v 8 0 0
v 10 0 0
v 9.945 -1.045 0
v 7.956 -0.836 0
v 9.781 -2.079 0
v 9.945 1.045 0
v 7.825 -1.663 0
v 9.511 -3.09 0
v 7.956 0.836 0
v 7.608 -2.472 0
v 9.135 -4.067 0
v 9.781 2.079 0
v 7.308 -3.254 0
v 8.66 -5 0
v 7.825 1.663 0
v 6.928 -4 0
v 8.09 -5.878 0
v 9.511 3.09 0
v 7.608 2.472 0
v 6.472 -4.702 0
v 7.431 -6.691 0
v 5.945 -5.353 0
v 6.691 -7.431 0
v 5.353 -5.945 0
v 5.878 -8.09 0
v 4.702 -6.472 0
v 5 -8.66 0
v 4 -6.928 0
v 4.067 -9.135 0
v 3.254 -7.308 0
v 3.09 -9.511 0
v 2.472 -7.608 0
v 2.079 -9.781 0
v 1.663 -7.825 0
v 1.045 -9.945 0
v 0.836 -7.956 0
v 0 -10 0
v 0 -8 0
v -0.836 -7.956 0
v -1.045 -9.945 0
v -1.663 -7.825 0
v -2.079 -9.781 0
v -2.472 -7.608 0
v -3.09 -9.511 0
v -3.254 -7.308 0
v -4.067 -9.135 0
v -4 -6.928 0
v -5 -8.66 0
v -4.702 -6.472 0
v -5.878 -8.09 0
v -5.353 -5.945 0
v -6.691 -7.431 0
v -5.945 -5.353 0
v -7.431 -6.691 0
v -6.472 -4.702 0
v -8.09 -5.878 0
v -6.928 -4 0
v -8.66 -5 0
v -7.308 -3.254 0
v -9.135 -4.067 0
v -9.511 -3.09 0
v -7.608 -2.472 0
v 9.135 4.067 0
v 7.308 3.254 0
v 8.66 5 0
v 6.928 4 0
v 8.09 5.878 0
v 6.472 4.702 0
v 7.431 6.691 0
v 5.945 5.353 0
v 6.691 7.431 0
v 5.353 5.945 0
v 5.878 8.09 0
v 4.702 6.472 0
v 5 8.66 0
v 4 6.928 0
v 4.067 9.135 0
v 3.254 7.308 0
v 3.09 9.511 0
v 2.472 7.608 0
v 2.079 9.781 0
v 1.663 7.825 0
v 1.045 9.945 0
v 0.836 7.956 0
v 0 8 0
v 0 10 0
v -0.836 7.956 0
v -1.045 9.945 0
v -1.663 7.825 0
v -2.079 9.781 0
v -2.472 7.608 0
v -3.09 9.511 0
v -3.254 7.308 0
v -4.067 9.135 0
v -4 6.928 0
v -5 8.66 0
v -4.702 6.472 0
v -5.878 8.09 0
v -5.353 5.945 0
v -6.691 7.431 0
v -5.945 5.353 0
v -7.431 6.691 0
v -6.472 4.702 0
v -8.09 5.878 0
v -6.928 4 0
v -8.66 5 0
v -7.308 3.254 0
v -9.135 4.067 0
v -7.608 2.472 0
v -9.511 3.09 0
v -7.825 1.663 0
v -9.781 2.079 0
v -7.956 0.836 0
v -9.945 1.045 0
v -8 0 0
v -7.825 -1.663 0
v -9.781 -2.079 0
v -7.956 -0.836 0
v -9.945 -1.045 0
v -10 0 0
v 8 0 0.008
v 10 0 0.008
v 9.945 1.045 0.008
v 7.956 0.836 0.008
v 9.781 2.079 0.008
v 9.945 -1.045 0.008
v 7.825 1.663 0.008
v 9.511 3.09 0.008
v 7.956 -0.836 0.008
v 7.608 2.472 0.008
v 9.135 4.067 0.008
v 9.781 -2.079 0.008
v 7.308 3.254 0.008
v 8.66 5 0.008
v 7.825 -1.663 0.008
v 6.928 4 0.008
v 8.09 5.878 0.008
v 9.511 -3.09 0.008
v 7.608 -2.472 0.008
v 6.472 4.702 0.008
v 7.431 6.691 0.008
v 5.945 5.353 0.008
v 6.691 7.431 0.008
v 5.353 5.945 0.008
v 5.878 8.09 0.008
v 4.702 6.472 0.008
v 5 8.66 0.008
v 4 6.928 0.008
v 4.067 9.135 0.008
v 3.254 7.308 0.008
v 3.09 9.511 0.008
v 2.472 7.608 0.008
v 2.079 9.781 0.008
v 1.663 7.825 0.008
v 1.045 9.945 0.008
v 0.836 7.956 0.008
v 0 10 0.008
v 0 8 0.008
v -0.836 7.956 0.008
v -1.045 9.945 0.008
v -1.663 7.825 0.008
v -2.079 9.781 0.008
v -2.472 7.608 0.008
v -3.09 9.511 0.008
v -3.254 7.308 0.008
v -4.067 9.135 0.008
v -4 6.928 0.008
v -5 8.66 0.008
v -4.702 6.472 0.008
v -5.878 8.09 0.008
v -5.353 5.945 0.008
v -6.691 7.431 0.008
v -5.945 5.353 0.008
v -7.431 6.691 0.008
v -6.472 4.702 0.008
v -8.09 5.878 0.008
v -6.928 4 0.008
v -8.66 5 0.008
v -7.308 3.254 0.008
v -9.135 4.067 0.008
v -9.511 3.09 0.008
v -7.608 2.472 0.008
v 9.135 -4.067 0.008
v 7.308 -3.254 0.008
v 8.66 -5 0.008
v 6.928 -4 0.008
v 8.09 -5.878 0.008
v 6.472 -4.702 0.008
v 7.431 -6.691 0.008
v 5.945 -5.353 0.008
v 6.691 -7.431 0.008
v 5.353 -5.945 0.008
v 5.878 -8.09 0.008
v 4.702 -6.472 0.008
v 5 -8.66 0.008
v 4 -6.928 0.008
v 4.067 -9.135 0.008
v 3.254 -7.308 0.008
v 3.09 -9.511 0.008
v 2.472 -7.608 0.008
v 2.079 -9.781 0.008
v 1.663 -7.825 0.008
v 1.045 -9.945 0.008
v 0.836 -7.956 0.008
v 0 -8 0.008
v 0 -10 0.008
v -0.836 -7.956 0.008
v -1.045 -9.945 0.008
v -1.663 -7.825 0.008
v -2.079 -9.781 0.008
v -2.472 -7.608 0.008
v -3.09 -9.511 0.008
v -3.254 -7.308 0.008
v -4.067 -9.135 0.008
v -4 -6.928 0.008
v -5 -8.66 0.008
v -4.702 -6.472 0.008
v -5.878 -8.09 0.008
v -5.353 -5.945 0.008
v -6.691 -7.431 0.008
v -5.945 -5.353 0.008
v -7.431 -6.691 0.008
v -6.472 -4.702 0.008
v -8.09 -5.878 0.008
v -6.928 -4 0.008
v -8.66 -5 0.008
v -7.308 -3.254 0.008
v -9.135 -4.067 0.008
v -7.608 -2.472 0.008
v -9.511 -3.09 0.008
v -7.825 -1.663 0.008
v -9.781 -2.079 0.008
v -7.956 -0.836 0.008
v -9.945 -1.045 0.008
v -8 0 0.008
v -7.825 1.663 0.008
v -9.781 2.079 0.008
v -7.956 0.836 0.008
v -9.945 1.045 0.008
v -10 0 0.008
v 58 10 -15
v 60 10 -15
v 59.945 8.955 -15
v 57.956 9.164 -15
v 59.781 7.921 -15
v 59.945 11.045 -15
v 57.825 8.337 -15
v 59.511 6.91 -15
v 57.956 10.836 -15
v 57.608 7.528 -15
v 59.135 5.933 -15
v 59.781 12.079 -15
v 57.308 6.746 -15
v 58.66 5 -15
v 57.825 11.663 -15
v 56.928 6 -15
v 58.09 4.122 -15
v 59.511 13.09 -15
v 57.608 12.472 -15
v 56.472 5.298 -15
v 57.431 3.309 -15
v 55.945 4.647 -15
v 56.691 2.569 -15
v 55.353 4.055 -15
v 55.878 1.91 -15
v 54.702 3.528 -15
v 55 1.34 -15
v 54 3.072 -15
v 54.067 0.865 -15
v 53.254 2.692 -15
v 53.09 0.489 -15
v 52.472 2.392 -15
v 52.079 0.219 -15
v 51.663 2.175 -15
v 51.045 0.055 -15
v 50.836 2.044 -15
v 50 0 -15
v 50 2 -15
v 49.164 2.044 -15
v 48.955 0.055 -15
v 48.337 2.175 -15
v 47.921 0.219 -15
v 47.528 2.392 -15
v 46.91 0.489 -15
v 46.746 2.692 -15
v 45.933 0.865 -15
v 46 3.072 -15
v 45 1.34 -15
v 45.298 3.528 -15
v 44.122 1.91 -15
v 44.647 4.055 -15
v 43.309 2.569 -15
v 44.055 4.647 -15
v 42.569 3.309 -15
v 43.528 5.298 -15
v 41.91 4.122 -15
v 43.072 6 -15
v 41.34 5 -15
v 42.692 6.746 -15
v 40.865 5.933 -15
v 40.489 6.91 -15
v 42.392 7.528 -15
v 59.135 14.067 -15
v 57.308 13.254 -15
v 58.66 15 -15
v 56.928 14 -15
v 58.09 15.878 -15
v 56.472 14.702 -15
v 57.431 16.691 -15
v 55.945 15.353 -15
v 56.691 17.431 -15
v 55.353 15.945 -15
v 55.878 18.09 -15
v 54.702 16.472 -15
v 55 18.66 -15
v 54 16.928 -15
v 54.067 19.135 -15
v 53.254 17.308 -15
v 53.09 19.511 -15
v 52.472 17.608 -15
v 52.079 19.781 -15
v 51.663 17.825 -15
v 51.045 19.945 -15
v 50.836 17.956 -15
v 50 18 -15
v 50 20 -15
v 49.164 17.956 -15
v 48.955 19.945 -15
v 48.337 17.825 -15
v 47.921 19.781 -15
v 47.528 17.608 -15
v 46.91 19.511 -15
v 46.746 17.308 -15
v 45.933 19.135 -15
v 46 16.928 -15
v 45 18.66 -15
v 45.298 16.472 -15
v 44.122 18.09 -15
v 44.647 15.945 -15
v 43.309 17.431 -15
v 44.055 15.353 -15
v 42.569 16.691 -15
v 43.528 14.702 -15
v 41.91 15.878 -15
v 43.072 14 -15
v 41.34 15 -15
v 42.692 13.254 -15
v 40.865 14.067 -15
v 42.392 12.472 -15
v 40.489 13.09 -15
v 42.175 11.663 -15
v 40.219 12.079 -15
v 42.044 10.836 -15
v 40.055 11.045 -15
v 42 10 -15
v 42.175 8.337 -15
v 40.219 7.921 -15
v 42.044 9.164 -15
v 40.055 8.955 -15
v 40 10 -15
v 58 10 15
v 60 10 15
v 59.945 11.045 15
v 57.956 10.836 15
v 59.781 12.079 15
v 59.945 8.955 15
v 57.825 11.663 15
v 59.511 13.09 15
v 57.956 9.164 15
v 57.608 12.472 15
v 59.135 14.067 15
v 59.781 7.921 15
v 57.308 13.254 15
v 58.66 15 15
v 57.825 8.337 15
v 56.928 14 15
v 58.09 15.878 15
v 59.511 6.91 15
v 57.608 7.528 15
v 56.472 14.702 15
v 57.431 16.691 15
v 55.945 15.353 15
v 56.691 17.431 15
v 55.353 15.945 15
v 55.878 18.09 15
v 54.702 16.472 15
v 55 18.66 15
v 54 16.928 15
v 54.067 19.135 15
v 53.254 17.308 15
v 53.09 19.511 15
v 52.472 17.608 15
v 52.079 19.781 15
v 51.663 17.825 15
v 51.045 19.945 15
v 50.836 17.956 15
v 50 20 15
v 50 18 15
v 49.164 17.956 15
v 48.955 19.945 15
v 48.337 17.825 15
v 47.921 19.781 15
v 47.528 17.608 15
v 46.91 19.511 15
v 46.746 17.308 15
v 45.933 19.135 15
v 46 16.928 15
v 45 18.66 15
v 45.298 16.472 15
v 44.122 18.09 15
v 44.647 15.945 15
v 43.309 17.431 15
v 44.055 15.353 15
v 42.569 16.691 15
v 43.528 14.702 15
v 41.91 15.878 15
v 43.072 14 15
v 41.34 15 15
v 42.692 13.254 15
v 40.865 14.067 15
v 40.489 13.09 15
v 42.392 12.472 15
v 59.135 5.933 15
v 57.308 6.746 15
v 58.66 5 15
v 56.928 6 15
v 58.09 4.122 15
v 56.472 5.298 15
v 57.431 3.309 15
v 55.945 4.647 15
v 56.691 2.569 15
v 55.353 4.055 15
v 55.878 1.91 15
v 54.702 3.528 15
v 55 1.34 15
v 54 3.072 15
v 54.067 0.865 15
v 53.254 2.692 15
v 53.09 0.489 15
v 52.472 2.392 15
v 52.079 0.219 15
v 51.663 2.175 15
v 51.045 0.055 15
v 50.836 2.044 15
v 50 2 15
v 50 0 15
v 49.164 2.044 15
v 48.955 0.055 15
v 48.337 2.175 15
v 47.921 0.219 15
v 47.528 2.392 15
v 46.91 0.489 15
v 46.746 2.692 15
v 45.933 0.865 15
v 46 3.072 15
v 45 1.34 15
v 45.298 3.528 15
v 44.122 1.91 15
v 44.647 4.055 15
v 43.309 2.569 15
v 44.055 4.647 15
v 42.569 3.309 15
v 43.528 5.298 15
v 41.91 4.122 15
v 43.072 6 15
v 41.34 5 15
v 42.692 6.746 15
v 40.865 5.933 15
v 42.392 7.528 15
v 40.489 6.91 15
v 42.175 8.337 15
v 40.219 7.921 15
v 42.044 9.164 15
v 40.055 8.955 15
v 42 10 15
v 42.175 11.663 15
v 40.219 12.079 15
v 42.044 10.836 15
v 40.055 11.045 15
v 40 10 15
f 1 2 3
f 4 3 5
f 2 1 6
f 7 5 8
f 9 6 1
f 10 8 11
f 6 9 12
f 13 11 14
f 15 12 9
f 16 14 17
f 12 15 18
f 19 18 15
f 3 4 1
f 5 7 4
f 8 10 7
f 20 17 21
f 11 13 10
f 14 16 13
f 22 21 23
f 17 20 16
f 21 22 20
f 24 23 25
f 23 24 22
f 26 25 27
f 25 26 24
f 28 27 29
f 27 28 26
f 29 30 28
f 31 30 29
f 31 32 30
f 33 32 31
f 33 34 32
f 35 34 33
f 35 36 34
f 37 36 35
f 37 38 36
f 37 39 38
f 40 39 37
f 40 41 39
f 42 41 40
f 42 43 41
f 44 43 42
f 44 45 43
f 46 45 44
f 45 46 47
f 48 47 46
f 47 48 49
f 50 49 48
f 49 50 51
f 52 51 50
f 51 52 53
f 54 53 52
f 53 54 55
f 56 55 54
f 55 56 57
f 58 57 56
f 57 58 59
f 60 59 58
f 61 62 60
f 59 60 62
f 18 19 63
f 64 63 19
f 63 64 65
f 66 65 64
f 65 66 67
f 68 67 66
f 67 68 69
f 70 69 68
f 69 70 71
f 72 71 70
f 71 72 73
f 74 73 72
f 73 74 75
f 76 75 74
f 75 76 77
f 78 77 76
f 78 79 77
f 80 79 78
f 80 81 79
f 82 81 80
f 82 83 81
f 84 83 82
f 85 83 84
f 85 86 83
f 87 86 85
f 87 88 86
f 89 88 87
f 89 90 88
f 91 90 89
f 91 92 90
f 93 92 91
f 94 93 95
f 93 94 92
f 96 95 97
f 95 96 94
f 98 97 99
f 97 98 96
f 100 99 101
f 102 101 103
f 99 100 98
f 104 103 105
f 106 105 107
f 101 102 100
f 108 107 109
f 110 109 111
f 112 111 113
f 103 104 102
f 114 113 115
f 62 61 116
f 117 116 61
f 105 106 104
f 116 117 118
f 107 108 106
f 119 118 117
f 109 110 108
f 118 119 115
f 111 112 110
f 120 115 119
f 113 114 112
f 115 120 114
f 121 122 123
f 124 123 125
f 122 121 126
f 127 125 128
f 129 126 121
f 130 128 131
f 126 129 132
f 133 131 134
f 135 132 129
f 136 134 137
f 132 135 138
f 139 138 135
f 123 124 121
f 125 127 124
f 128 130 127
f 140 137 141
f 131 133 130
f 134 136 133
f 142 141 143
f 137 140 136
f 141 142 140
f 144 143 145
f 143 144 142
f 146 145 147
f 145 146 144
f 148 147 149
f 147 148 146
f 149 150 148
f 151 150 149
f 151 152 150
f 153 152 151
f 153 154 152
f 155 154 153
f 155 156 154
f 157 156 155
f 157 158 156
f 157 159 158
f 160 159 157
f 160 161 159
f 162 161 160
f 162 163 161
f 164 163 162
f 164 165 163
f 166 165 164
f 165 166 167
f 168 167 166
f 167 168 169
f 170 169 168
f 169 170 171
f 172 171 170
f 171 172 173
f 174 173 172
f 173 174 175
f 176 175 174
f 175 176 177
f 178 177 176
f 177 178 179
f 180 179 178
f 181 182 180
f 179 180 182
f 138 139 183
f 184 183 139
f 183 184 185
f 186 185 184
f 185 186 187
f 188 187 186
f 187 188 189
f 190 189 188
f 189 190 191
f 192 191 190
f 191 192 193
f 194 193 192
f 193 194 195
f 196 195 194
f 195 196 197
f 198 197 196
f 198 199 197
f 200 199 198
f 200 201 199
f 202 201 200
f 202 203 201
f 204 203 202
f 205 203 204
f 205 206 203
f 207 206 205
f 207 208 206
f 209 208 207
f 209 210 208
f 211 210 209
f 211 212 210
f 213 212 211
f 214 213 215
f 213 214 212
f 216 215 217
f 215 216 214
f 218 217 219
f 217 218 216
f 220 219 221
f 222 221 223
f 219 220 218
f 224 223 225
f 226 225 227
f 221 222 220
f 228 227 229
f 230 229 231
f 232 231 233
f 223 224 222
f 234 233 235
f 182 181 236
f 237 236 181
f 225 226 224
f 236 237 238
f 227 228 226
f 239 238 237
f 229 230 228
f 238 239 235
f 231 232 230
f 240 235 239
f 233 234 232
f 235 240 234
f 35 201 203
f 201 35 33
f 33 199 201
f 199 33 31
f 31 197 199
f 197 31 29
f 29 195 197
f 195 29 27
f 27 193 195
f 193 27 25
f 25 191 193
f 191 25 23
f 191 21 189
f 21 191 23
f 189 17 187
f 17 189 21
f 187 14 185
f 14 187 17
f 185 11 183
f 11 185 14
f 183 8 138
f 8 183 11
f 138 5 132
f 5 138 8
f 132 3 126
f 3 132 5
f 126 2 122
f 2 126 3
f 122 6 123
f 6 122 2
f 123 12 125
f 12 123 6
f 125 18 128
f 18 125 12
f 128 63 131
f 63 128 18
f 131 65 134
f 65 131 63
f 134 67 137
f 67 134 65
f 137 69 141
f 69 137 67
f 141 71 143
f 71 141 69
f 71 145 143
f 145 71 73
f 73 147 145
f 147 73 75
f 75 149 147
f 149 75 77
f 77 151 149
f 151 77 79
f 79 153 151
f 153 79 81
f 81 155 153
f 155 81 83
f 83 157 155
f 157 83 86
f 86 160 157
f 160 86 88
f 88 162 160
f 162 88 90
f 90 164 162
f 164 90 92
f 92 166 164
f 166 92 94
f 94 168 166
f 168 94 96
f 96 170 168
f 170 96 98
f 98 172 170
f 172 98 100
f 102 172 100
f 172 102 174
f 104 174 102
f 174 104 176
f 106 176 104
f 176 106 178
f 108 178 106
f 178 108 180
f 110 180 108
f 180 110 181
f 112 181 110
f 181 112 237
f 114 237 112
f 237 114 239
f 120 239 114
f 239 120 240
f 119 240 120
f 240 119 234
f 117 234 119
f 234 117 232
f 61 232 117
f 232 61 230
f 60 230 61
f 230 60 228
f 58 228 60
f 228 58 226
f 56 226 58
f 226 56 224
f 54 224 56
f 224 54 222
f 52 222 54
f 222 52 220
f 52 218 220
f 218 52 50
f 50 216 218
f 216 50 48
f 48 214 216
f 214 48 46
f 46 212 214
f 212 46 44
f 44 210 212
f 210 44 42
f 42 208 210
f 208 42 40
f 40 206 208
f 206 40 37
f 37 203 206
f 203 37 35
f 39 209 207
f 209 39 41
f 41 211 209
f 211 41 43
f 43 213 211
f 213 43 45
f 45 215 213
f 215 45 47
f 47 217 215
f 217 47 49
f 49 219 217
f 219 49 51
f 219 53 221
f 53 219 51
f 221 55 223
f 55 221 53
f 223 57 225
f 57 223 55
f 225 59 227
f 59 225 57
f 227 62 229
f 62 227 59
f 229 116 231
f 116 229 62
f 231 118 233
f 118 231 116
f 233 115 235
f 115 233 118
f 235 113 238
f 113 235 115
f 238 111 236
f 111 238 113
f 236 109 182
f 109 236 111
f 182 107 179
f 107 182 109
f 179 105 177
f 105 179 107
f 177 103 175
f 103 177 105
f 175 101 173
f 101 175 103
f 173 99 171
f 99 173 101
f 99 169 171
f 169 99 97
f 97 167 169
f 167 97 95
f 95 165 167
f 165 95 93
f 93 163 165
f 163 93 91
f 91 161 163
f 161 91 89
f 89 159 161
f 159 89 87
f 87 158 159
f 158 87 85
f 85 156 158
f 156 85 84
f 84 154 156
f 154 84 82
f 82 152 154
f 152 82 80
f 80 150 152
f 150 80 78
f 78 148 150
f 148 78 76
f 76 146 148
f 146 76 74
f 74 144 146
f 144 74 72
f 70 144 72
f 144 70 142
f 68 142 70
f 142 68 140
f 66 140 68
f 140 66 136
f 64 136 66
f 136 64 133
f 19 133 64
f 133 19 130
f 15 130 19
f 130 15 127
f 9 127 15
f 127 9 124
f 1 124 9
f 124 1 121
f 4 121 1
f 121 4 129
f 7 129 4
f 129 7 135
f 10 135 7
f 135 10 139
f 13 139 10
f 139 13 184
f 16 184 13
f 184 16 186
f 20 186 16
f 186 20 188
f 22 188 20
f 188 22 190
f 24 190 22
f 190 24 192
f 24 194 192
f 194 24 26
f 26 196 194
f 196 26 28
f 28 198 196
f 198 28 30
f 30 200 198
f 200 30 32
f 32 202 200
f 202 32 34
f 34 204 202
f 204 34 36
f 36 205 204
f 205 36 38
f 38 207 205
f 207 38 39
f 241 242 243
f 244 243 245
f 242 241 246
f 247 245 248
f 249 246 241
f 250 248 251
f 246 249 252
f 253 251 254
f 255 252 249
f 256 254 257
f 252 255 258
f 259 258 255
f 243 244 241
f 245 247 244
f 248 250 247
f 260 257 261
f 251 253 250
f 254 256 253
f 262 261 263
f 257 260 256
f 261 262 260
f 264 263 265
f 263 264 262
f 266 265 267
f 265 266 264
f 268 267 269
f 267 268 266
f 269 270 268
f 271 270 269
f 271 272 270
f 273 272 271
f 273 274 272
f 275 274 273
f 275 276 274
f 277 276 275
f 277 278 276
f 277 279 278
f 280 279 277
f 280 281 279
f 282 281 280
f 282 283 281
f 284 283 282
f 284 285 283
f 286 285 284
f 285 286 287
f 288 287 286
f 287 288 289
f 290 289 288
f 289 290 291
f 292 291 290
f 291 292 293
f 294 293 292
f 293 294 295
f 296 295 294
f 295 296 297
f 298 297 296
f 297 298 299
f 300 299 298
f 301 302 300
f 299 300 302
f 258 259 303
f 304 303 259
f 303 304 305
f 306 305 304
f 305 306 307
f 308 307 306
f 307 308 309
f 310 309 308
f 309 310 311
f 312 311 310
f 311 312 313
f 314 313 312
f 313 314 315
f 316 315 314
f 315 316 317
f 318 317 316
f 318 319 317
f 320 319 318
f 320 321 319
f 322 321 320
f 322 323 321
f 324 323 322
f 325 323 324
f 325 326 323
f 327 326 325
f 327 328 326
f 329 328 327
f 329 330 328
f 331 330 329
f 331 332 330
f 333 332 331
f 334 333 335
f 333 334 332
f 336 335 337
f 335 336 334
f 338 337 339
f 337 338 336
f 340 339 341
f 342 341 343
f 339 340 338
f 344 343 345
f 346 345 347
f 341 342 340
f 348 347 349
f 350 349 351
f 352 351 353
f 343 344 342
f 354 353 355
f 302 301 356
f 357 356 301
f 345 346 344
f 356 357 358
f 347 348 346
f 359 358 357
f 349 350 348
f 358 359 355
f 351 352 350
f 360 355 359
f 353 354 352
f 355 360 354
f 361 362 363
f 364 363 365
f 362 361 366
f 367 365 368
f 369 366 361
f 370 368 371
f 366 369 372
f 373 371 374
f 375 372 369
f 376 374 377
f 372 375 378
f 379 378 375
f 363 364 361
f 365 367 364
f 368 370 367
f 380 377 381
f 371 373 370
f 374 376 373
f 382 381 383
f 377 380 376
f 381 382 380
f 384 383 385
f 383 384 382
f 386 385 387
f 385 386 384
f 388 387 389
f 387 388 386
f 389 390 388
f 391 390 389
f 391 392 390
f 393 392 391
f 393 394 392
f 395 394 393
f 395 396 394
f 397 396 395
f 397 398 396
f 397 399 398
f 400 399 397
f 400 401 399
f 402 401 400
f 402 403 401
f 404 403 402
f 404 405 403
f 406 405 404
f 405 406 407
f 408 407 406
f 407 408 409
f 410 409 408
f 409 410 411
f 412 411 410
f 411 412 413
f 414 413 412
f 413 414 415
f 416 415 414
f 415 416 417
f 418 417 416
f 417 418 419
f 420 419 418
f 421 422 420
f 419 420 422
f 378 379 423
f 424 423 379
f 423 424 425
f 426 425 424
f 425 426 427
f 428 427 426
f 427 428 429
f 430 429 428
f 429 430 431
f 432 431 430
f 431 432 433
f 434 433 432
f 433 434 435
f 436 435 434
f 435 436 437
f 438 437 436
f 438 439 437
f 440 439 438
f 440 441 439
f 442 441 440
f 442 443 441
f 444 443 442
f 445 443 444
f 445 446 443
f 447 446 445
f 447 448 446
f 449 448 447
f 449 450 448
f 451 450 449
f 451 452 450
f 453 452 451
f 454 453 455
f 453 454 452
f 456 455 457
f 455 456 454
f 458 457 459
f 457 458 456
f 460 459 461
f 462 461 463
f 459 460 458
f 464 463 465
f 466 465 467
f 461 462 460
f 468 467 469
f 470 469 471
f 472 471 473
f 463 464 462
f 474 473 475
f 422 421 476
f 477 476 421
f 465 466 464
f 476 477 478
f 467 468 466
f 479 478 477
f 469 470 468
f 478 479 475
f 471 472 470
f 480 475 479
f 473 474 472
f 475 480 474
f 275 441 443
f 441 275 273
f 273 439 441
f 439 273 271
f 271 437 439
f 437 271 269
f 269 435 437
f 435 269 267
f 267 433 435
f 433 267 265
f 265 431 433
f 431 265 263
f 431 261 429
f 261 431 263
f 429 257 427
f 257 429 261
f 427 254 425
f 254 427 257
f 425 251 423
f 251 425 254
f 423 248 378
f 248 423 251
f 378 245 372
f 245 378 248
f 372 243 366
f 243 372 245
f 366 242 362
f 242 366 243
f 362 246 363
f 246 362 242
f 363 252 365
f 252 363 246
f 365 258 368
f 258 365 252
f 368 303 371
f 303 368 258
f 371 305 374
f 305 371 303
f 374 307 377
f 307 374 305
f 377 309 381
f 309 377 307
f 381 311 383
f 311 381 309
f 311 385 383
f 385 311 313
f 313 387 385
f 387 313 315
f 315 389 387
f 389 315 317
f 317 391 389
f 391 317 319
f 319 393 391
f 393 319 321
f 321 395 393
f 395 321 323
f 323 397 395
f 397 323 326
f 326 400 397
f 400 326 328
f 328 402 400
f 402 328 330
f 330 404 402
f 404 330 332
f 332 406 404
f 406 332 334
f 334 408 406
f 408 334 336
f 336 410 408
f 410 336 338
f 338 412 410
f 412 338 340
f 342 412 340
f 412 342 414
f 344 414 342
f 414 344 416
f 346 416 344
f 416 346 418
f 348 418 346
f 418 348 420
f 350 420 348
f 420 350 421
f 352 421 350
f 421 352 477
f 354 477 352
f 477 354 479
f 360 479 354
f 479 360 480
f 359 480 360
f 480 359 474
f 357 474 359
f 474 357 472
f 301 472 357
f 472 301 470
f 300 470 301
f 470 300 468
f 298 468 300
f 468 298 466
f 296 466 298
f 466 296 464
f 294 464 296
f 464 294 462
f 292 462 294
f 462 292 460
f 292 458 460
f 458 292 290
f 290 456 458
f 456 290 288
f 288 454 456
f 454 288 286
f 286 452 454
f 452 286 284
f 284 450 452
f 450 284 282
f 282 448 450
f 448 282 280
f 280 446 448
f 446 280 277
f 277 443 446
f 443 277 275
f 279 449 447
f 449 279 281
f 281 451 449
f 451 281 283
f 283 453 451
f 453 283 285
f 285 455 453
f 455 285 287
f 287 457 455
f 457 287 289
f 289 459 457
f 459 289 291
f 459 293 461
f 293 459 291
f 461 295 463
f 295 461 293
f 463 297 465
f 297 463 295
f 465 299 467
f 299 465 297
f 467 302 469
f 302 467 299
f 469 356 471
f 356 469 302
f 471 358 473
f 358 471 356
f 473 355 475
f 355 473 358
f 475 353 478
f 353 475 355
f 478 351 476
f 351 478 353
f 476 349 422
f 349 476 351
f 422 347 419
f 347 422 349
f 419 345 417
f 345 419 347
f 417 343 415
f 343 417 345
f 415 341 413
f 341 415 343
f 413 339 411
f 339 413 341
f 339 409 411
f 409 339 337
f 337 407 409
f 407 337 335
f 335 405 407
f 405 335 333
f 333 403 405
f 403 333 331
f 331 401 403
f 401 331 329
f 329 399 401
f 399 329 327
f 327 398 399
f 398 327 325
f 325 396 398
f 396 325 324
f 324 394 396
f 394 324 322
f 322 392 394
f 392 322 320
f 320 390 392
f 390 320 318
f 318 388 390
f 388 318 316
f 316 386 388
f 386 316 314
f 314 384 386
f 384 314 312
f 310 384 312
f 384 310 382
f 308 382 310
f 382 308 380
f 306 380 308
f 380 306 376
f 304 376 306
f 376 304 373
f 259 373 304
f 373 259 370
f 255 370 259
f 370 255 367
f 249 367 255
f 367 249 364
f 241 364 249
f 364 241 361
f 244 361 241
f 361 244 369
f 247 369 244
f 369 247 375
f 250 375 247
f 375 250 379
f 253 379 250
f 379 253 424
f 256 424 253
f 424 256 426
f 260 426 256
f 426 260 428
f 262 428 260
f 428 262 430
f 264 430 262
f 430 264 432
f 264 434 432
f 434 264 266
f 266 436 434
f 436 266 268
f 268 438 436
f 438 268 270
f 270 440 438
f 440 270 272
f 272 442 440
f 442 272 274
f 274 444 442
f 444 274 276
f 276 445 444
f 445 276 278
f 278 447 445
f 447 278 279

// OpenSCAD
// file: ../utils/core/clip.scad
//
// NopSCADlib Copyright Chris Palmer 2018
// nop.head@gmail.com
// hydraraptor.blogspot.com
//
// This file is part of NopSCADlib.
//
// NopSCADlib is free software: you can redistribute it and/or modify it under the terms of the
// GNU General Public License as published by the Free Software Foundation, either version 3 of
// the License, or (at your option) any later version.
//
// NopSCADlib is distributed in the hope that it will be useful, but WITHOUT ANY WARRANTY;
// without even the implied warranty of MERCHANTABILITY or FITNESS FOR A PARTICULAR PURPOSE.
// See the GNU General Public License for more details.
//
// You should have received a copy of the GNU General Public License along with NopSCADlib.
// If not, see <https://www.gnu.org/licenses/>.
//

//
//! Construct arbirarily large box to partition 3D space and clip objects, useful for creating cross sections to see the inside when debugging.
//!
//! Original version by Doug Moen on the OpenSCAD forum
//
//
module box(xmin, ymin, zmin, xmax, ymax, zmax) //! Construct a box given its bounds
    polyhedron(
        [[xmin, ymin, zmin],  // 0
         [xmin, ymin, zmax],  // 1
         [xmin, ymax, zmin],  // 2
         [xmin, ymax, zmax],  // 3
         [xmax, ymin, zmin],  // 4
         [xmax, ymin, zmax],  // 5
         [xmax, ymax, zmin],  // 6
         [xmax, ymax, zmax]], // 7
        [[7,5,1,3],  // top
         [2,0,4,6],  // bottom
         [5,4,0,1],  // front
         [3,2,6,7],  // back
         [5,7,6,4],  // right
         [0,2,3,1]]  // left
    );

module clip(xmin = -inf, ymin = -inf, zmin = -inf, xmax = inf, ymax = inf, zmax = inf) //! Clip child to specified boundaries
    render() intersection() {
        children();

        box(xmin, ymin, zmin, xmax, ymax, zmax);
    }
// file: ../utils/core/rounded_rectangle.scad
//
// NopSCADlib Copyright Chris Palmer 2018
// nop.head@gmail.com
// hydraraptor.blogspot.com
//
// This file is part of NopSCADlib.
//
// NopSCADlib is free software: you can redistribute it and/or modify it under the terms of the
// GNU General Public License as published by the Free Software Foundation, either version 3 of
// the License, or (at your option) any later version.
//
// NopSCADlib is distributed in the hope that it will be useful, but WITHOUT ANY WARRANTY;
// without even the implied warranty of MERCHANTABILITY or FITNESS FOR A PARTICULAR PURPOSE.
// See the GNU General Public License for more details.
//
// You should have received a copy of the GNU General Public License along with NopSCADlib.
// If not, see <https://www.gnu.org/licenses/>.
//

//
//! Rectangle with rounded corners.
//
module rounded_square(size, r, center = true) //! Like ```square()``` but with with rounded corners
{
    $fn = r2sides4n(r);
    offset(r) offset(-r) square(size, center = center);
}

module rounded_rectangle(size, r, center = true, xy_center = true) //! Like ```cube()``` but corners rounded in XY plane and separate centre options for xy and z.
{
    linear_extrude(size[2], center = center)
        rounded_square([size[0], size[1]], r, xy_center);
}
// file: ../utils/core/teardrops.scad
//
// NopSCADlib Copyright Chris Palmer 2018
// nop.head@gmail.com
// hydraraptor.blogspot.com
//
// This file is part of NopSCADlib.
//
// NopSCADlib is free software: you can redistribute it and/or modify it under the terms of the
// GNU General Public License as published by the Free Software Foundation, either version 3 of
// the License, or (at your option) any later version.
//
// NopSCADlib is distributed in the hope that it will be useful, but WITHOUT ANY WARRANTY;
// without even the implied warranty of MERCHANTABILITY or FITNESS FOR A PARTICULAR PURPOSE.
// See the GNU General Public License for more details.
//
// You should have received a copy of the GNU General Public License along with NopSCADlib.
// If not, see <https://www.gnu.org/licenses/>.
//

//
//! For making horizontal holes that don't need support material.
//! Small holes can get away without it, but they print better with truncated teardrops.
//
module teardrop(h, r, center = true, truncate = true, chamfer = 0) { //! For making horizontal holes that don't need support material, set ```truncate = false``` to make traditional RepRap teardrops that don't even need bridging
    module teardrop_2d(r, truncate) {
        hull() {
            circle4n(r);
            if(truncate)
                translate([0, r / 2])
                    square([2 * r * (sqrt(2) - 1), r], center = true);
            else
                polygon([[0, 0], [eps, 0], [0, r * sqrt(2)]]);
        }
    }

    render(convexity = 5)
        extrude_if(h, center)
            teardrop_2d(r, truncate);

    teardrop_chamfer(h, center, chamfer) {
        linear_extrude(eps, center = true)
            teardrop_2d(r + chamfer / 2, truncate);
        translate_z(-chamfer / 2)
            linear_extrude(eps, center = true)
                teardrop_2d(r, truncate);
    }
}

module semi_teardrop(h, r, d = undef, center = true, chamfer = 0) { //! A semi teardrop in the positive Y domain
    module semi_teardrop_2d(r, d) {
        intersection() {
            R = is_undef(d) ? r : d / 2;
            teardrop(r = R, h = 0);

            sq = R + 1;
            translate([-sq, 0])
                square([2 * sq, sq]);
        }
    }

    render(convexity = 5)
        extrude_if(h, center)
            semi_teardrop_2d(r, d);

    teardrop_chamfer(h, center, chamfer) {
        linear_extrude(eps, center = true)
            semi_teardrop_2d(r + chamfer / 2, d);
        translate_z(-chamfer / 2)
            linear_extrude(eps, center = true)
                semi_teardrop_2d(r, d);
    }
}

module teardrop_plus(h, r, center = true, truncate = true, chamfer = 0) //! Slightly bigger teardrop to allow for the 3D printing staircase effect
    teardrop(h, r + layer_height / 4, center, truncate, chamfer);

module tearslot(h, r, w, center = true, chamfer = 0) { //! A horizontal slot that doesn't need support material
    module tearslot_2d(r, w) {
        hull() {
            translate([-w / 2, 0]) teardrop(r = r, h = 0);
            translate([w / 2, 0]) teardrop(r = r, h = 0);
        }
    }

    extrude_if(h, center)
        tearslot_2d(r, w);

    teardrop_chamfer(h, center, chamfer) {
        linear_extrude(eps, center = true)
            tearslot_2d(r + chamfer / 2, w);
        translate_z(-chamfer / 2)
            linear_extrude(eps, center = true)
                tearslot_2d(r, w);
    }
}

module vertical_tearslot(h, r, l, center = true, chamfer = 0) { //! A vertical slot that doesn't need support material
    module vertical_tearslot_2d(r, l) {
        hull() {
            translate([0,  l / 2]) teardrop(0, r, true);
            translate([0, -l / 2]) circle4n(r);
        }
    }

    extrude_if(h, center)
        vertical_tearslot_2d(r, l);

    teardrop_chamfer(h, center, chamfer) {
        linear_extrude(eps, center = true)
            vertical_tearslot_2d(r + chamfer / 2, l);
        translate_z(-chamfer / 2)
            linear_extrude(eps, center = true)
                vertical_tearslot_2d(r, l);
    }
}

module teardrop_chamfer(h, center, chamfer) { //! Helper module for adding chamfer to a teardrop
    if(h && chamfer)
        translate_z(center ? 0 : h / 2)
            for(m = [0, 1])
                mirror([0, 0, m])
                    translate_z((h - eps ) / 2)
                        hull()
                            children();
}
// file: ../utils/core/polyholes.scad
//
// NopSCADlib Copyright Chris Palmer 2018
// nop.head@gmail.com
// hydraraptor.blogspot.com
//
// This file is part of NopSCADlib.
//
// NopSCADlib is free software: you can redistribute it and/or modify it under the terms of the
// GNU General Public License as published by the Free Software Foundation, either version 3 of
// the License, or (at your option) any later version.
//
// NopSCADlib is distributed in the hope that it will be useful, but WITHOUT ANY WARRANTY;
// without even the implied warranty of MERCHANTABILITY or FITNESS FOR A PARTICULAR PURPOSE.
// See the GNU General Public License for more details.
//
// You should have received a copy of the GNU General Public License along with NopSCADlib.
// If not, see <https://www.gnu.org/licenses/>.
//

//
//! A method of making 3D printed holes come out the right size regardless of the printer, providing
//! it gets the linear dimensions right. See <https://hydraraptor.blogspot.com/2011/02/polyholes.html>
//!
//! The module provides `poly_circle()`, `poly_cylinder()` and `poly_ring()` that is useful for making printed washers and pillars.
//
function sides(r) = max(round(4 * r), 3);                                       //! Optimium number of sides for specified radius
function corrected_radius(r, n = 0)   = r / cos(180 / (n ? n : sides(r)));      //! Adjusted radius to make flats lie on the circle
function corrected_diameter(d, n = 0) = d / cos(180 / (n ? n : sides(d / 2)));  //! Adjusted diameter to make flats lie on the circle

module poly_circle(r, sides = 0) { //! Make a circle adjusted to print the correct size
    n = sides ? sides : sides(r);
    circle(r = corrected_radius(r,n), $fn = n);
}

module poly_cylinder(r, h, center = false, sides = 0) //! Make a cylinder adjusted to print the correct size
    extrude_if(h, center)
        poly_circle(r, sides);

module poly_ring(or, ir) { //! Make a 2D ring adjusted to have the correct internal radius
    cir = corrected_radius(ir);
    filaments = (or - cir) / extrusion_width;
    if(filaments > 3 + eps)
        difference() {
            circle(or);

            poly_circle(ir);
        }
    else
        if(filaments >= 2)
            difference() {
                offset(or - cir)
                    poly_circle(ir);

                poly_circle(ir);
            }
            else
                difference() {
                    poly_circle(or);

                    offset(-squeezed_wall)
                        poly_circle(or);
                }
}

module poly_tube(or, ir, h, center = false) //! Make a tube adjusted to have the correct internal radius
    extrude_if(h, center)
        poly_ring(or, ir);

module drill(r, h = 100) //! Make a cylinder for drilling holes suitable for CNC routing, set h = 0 for circle
    extrude_if(h)
        circle(r = corrected_radius(r, r2sides(r)));
//
// Horizontal slot
//
module slot(r, l, h = 100) //! Make a horizontal slot suitable for CNC routing, set h = 0 for 2D version
    extrude_if(h)
        hull() {
            translate([l / 2,0])
                drill(r, 0);

            translate([-l / 2,0])
                drill(r, 0);
        }
// file: ../utils/core/bom.scad
//
// NopSCADlib Copyright Chris Palmer 2018
// nop.head@gmail.com
// hydraraptor.blogspot.com
//
// This file is part of NopSCADlib.
//
// NopSCADlib is free software: you can redistribute it and/or modify it under the terms of the
// GNU General Public License as published by the Free Software Foundation, either version 3 of
// the License, or (at your option) any later version.
//
// NopSCADlib is distributed in the hope that it will be useful, but WITHOUT ANY WARRANTY;
// without even the implied warranty of MERCHANTABILITY or FITNESS FOR A PARTICULAR PURPOSE.
// See the GNU General Public License for more details.
//
// You should have received a copy of the GNU General Public License along with NopSCADlib.
// If not, see <https://www.gnu.org/licenses/>.
//

//
//! Bill Of Materials generation via echo and the ```bom.py``` script. Also handles exploded assembly views and posing. Assembly instructions can precede the module
//! definition that makes the assembly.
//!
//! The example below shows how to define a vitamin and incorporate it into an assembly with sub-assemblies and make an exploded view. The resulting flat BOM is shown but
//! heirachical BOMs are also generated for real projects.
//
function bom_mode(n = 1) = $_bom >= n && (is_undef($on_bom) || $on_bom);  //! Current BOM mode, 0 = none, 1 = printed and routed parts and assemblies, 2 includes vitamins as well
function exploded() = is_undef($exploded_parent) ? $exploded : 0;   //! Returns the value of ```$exploded``` if it is defined, else ```0```
function show_supports() = !$preview || exploded();                 //! True if printed support material should be shown

module no_explode() let($exploded_parent = true) children();        //! Prevent children being exploded
module no_pose() let($posed = true) children();                     //! Force children not to be posed even if parent is

module explode(d, explode_children = false, offset = [0,0,0]) {     //! Explode children by specified Z distance or vector ```d```, option to explode grand children
    v = is_list(d) ? d : [0, 0, d];
    o = is_list(offset) ? offset : [0, 0, offset];
    if($exploded && is_undef($exploded_parent) && norm(v)) {
        translate(o)                                                // Draw the line first in case the child is transparent
            color("yellow") hull() {
                sphere(0.2);

                translate(v * $exploded)
                    sphere(0.2);
            }

        translate(v * $exploded)
            let($exploded_parent = explode_children ? undef : true)
                children();
    }
    else
        children();
}

module pose(a = [55, 0, 25], t = [0, 0, 0], exploded = undef)       //! Pose an STL or assembly for rendering to png by specifying rotation ```a``` and translation ```t```, ```exploded = true for``` just the exploded view or ```false``` for unexploded only.
    if(is_undef($pose) || !is_undef($posed) || (!is_undef(exploded) && exploded != !!exploded()))
        children();
    else
        let($posed = true) // only pose the top level
            rotate([55, 0, 25])
                rotate([-a.x, 0, 0])
                    rotate([0, -a.y, 0])
                        rotate([0, 0, -a.z])
                            translate(-t)
                                children();

module pose_hflip(exploded = undef)       //! Pose an STL or assembly for rendering to png by flipping around the Y axis, ```exploded = true for``` just the exploded view or ```false``` for unexploded only.
    if(is_undef($pose) || !is_undef($posed) || (!is_undef(exploded) && exploded != !!exploded()))
        children();
    else
        let($posed = true) // only pose the top level
            hflip()
                children();

module pose_vflip(exploded = undef)       //! Pose an STL or assembly for rendering to png by flipping around the X axis, ```exploded = true for``` just the exploded view or ```false``` for unexploded only.
    if(is_undef($pose) || !is_undef($posed) || (!is_undef(exploded) && exploded != !!exploded()))
        children();
    else
        let($posed = true) // only pose the top level
            vflip()
                children();


module assembly(name) {                 //! Name an assembly that will appear on the BOM, there needs to a module named ```<name>_assembly``` to make it
    if(bom_mode())
        echo(str("~", name, "_assembly{"));

    no_pose()
        if(is_undef($child_assembly))
            let($child_assembly = true)
                children();
        else
            no_explode()
                children();

    if(bom_mode())
        echo(str("~}", name, "_assembly"));
}

module stl(name) {                      //! Name an stl that will appear on the BOM, there needs to a module named ```<name>_stl``` to make it
    if(bom_mode())
        echo(str("~", name, ".stl"));
}

module dxf(name) {                      //! Name a dxf that will appear on the BOM, there needs to a module named ```<name>_dxf``` to make it
    if(bom_mode())
        echo(str("~", name, ".dxf"));
}

function value_string(value) = is_string(value) ? str("\"", value, "\"") : str(value); //! Convert ```value``` to a string or quote it if it is already a string

function arg(value, default, name = "") =   //! Create string for arg if not default, helper for ```vitamin()```
    value == default ? ""
                     : name ? str(", ", name, " = ", value_string(value))
                            : str(", ", value_string(value));

module vitamin(description) {                //! Describe a vitamin for the BOM entry and precede it with a module call that creates it, eg. "wigit(42): Type 42 widget"
    if(bom_mode(2))
        echo(str("~", description, !is_undef($hidden) ? " - not shown" : ""));
}

module not_on_bom(on = false)               //! Specify the following child parts are not on the BOM, for example when they are on a PCB that comes assembled
    let($on_bom = on)
        children();

module hidden()                             //! Make item invisible, except on the BOM
    scale(1 / sqr(1024))
        let($hidden = true)
            children();
// file: ../utils/core/sphere.scad
//
// NopSCADlib Copyright Chris Palmer 2018
// nop.head@gmail.com
// hydraraptor.blogspot.com
//
// This file is part of NopSCADlib.
//
// NopSCADlib is free software: you can redistribute it and/or modify it under the terms of the
// GNU General Public License as published by the Free Software Foundation, either version 3 of
// the License, or (at your option) any later version.
//
// NopSCADlib is distributed in the hope that it will be useful, but WITHOUT ANY WARRANTY;
// without even the implied warranty of MERCHANTABILITY or FITNESS FOR A PARTICULAR PURPOSE.
// See the GNU General Public License for more details.
//
// You should have received a copy of the GNU General Public License along with NopSCADlib.
// If not, see <https://www.gnu.org/licenses/>.
//

//! Redefines `sphere()` to always have a vertex on all six half axes I.e. vertices at the poles and the equator and `$fn` a multiple of four.
//! This ensures `hull` and `minkowski` results have the correct dimensions when spheres are placed at the corners.

module sphere(r = 1, d = undef) {                   //! Override ```sphere``` so that has vertices on all three axes. Has the advantage of giving correct dimensions when hulled
    R = is_undef(d) ? r : d / 2;
    rotate_extrude($fn = r2sides4n(R))
        rotate(-90)
            semi_circle(R);
}
// file: ../utils/core/global.scad
//
// NopSCADlib Copyright Chris Palmer 2018
// nop.head@gmail.com
// hydraraptor.blogspot.com
//
// This file is part of NopSCADlib.
//
// NopSCADlib is free software: you can redistribute it and/or modify it under the terms of the
// GNU General Public License as published by the Free Software Foundation, either version 3 of
// the License, or (at your option) any later version.
//
// NopSCADlib is distributed in the hope that it will be useful, but WITHOUT ANY WARRANTY;
// without even the implied warranty of MERCHANTABILITY or FITNESS FOR A PARTICULAR PURPOSE.
// See the GNU General Public License for more details.
//
// You should have received a copy of the GNU General Public License along with NopSCADlib.
// If not, see <https://www.gnu.org/licenses/>.
//

//
//! Global constants, functions and modules. This file is used directly or indirectly in every scad file.
//
include <../../global_defs.scad>

function inch(x) = x * 25.4;                                                        //! Inch to mm conversion (For fractional inches, 'inch(1 + 7/8)' will work as expected.)
function foot(x) = x * 25.4 * 12;                                                   //! Foot to mm conversion
function yard(x) = x * 25.4 * 12 * 3;                                               //! Yard to mm conversion
function mm(x)   = x;                                                               //! Explicit mm specified
function cm(x)   = x * 10.0;                                                        //! cm to mm conversion
function m(x)    = x * 1000.0;                                                      //! m to mm conversion

function sqr(x) = x * x;                                                            //! Returns the square of ```x```
function echoit(x) = echo(x) x;                                                     //! Echo expression and return it, useful for debugging
function in(list, x) = !!len([for(v = list) if(v == x) true]);                      //! Returns true if ```x``` is an element in the ```list```
function Len(x) = is_list(x) ? len(x) : 0;                                          //! Returns the length of a list or 0 if ```x``` is not a list
function r2sides(r) = $fn ? $fn : ceil(max(min(360/ $fa, r * 2 * PI / $fs), 5));    //! Replicates the OpenSCAD logic to calculate the number of sides from the radius
function r2sides4n(r) = floor((r2sides(r) + 3) / 4) * 4;                            //! Round up the number of sides to a multiple of 4 to ensure points land on all axes

module translate_z(z) translate([0, 0, z]) children();                              //! Shortcut for Z only translations
module vflip() rotate([180, 0, 0]) children();                                      //! Invert children by doing a 180&deg; flip around the X axis
module hflip() rotate([0, 180, 0]) children();                                      //! Invert children by doing a 180&deg; flip around the Y axis
module ellipse(xr, yr) scale([1, yr / xr]) circle4n(xr);                            //! Draw an ellipse

module extrude_if(h, center = true)                 //! Extrudes 2D object to 3D when ```h``` is nonzero, otherwise leaves it 2D
    if(h)
        linear_extrude(h, center = center, convexity = 2) // 3D
            children();
    else
        children();                                 // 2D

module circle4n(r, d = undef) {                     //! Circle with multiple of 4 vertices
    R = is_undef(d) ? r : d / 2;
    circle(R, $fn = r2sides4n(R));
}

module semi_circle(r, d = undef)                    //! A semi circle in the positive Y domain
    intersection() {
        R = is_undef(d) ? r : d / 2;
        circle4n(R);

        sq = R + 1;
        translate([-sq, 0])
            square([2 * sq, sq]);
    }

module right_triangle(width, height, h, center = true) //! A right angled triangle with the 90&deg; corner at the origin. 3D when ```h``` is nonzero, otherwise 2D
    extrude_if(h, center = center)
        polygon(points = [[0,0], [width, 0], [0, height]]);

include <sphere.scad>
include <bom.scad>
include <polyholes.scad>
include <teardrops.scad>
include <rounded_rectangle.scad>
include <clip.scad>
// file: ../utils/core/core.scad
//
// NopSCADlib Copyright Chris Palmer 2018
// nop.head@gmail.com
// hydraraptor.blogspot.com
//
// This file is part of NopSCADlib.
//
// NopSCADlib is free software: you can redistribute it and/or modify it under the terms of the
// GNU General Public License as published by the Free Software Foundation, either version 3 of
// the License, or (at your option) any later version.
//
// NopSCADlib is distributed in the hope that it will be useful, but WITHOUT ANY WARRANTY;
// without even the implied warranty of MERCHANTABILITY or FITNESS FOR A PARTICULAR PURPOSE.
// See the GNU General Public License for more details.
//
// You should have received a copy of the GNU General Public License along with NopSCADlib.
// If not, see <https://www.gnu.org/licenses/>.
//

//
// Include this file to use the miniumum library
//
include <../../global_defs.scad>
//
// Global functions and modules
//
use <global.scad>

module use_stl(name) {               //! Import an STL to make a build platter
    stl(name);

    import(str("../stls/", name, ".stl"));
}

module use_dxf(name) {               //! Import a DXF to make a build panel
    dxf(name);

    import(str("../dxfs/", name, ".dxf"));
}
// file: ../utils/tube.scad
//
// NopSCADlib Copyright Chris Palmer 2018
// nop.head@gmail.com
// hydraraptor.blogspot.com
//
// This file is part of NopSCADlib.
//
// NopSCADlib is free software: you can redistribute it and/or modify it under the terms of the
// GNU General Public License as published by the Free Software Foundation, either version 3 of
// the License, or (at your option) any later version.
//
// NopSCADlib is distributed in the hope that it will be useful, but WITHOUT ANY WARRANTY;
// without even the implied warranty of MERCHANTABILITY or FITNESS FOR A PARTICULAR PURPOSE.
// See the GNU General Public License for more details.
//
// You should have received a copy of the GNU General Public License along with NopSCADlib.
// If not, see <https://www.gnu.org/licenses/>.
//

//
//! Simple tube or ring
//
include <../utils/core/core.scad>

module ring(or, ir) //! Create a ring with specified external and internal radii
        difference() {
            circle4n(or);
            circle4n(ir);
        }

module tube(or, ir, h, center = true) //! Create a tube with specified external and internal radii and height ```h```
    linear_extrude(h, center = center, convexity = 5)
        ring(or, ir);
// file: ../global_defs.scad
//
// NopSCADlib Copyright Chris Palmer 2018
// nop.head@gmail.com
// hydraraptor.blogspot.com
//
// This file is part of NopSCADlib.
//
// NopSCADlib is free software: you can redistribute it and/or modify it under the terms of the
// GNU General Public License as published by the Free Software Foundation, either version 3 of
// the License, or (at your option) any later version.
//
// NopSCADlib is distributed in the hope that it will be useful, but WITHOUT ANY WARRANTY;
// without even the implied warranty of MERCHANTABILITY or FITNESS FOR A PARTICULAR PURPOSE.
// See the GNU General Public License for more details.
//
// You should have received a copy of the GNU General Public License along with NopSCADlib.
// If not, see <https://www.gnu.org/licenses/>.
//

//
// This file included directly or indirectly in every scad file.
//
// This scheme allows the following:
//  bom defaults to 0
//  Setting $bom on the command line or in the main file before including lib.scad overrides it everywhere.
//  Setting $bom after including lib overrides bom in the libs but not in the local file.
//  Setting $_bom in the local file overrides it in the local file but not in the libs.
//
//function is_undef(x) = x == undef;

$_bom           = is_undef($bom)             ? 0      : $bom;             // 0 no bom, 1 assemblies and stls, 2 vitamins as well
$exploded       = is_undef($explode)         ? 0      : $explode;         // 1 for exploded view
layer_height    = is_undef($layer_height)    ? 0.25   : $layer_height;    // layer heigth when printing
extrusion_width = is_undef($extrusion_width) ? 0.5    : $extrusion_width; // filament width when printing
nozzle          = is_undef($nozzle)          ? 0.45   : $nozzle;          // 3D printer nozzle
cnc_bit_r       = is_undef($cnc_bit_r)       ? 1.2    : $cnc_bit_r;       // miniumum tool radius when milling 2D objects
pp1_colour      = is_undef($pp1_colour)      ? [0, 146/255, 0] : $pp1_colour; // printed part colour 1, RepRap logo colour
pp2_colour      = is_undef($pp2_colour)      ? "red"  : $pp2_colour;      // printed part colour 2
pp3_colour      = is_undef($pp3_colour)      ? "blue" : $pp3_colour;      // printed part colour 3
pp4_colour      = is_undef($pp4_colour)      ? "darkorange" : $pp4_colour;// printed part colour 4
show_rays       = is_undef($show_rays)       ? false  : $show_rays;       // show camera sight lines and light direction
show_threads    = is_undef($show_threads)    ? false  : $show_threads;    // show screw threads

// Minimum wall is about two filaments wide but we extrude it closer to get better bonding
squeezed_wall = $preview ? 2 * extrusion_width - layer_height * (1 - PI / 4)
                         : extrusion_width - layer_height / 2 + nozzle / 2 + extrusion_width / 2;

inf = 1e10;      // very big
eps = 1/128;     // small fudge factor to stop CSG barfing on coincident faces.
$fa = 6;
$fs = extrusion_width / 2;

function round_to_layer(z) = ceil(z / layer_height) * layer_height;
// Some additional named colors
grey20                          = [0.2, 0.2, 0.2];
grey30                          = [0.3, 0.3, 0.3];
grey40                          = [0.4, 0.4, 0.4];
grey50                          = [0.5, 0.5, 0.5];
grey60                          = [0.6, 0.6, 0.6];
grey70                          = [0.7, 0.7, 0.7];
grey80                          = [0.8, 0.8, 0.8];
grey90                          = [0.9, 0.9, 0.9];
gold                            = [255/255, 215/255, 0/255];
brass                           = [255/255, 220/255, 100/255];
silver                          = [0.75, 0.75, 0.75];

/*
 * Enums
 */
//
// Screws
//
hs_cap    = 0;
hs_pan    = 1;
hs_cs     = 2;     // counter sunk
hs_hex    = 3;
hs_grub   = 4;     // pulley set screw
hs_cs_cap = 5;
hs_dome   = 6;
//
// Hot end descriptions
//
jhead   = 1;
e3d     = 2;
//
// Face enumeration
//
f_bottom = 0;
f_top    = 1;
f_left   = 2;
f_right  = 3;
f_front  = 4;
f_back   = 5;
// main file
//
// NopSCADlib Copyright Chris Palmer 2018
// nop.head@gmail.com
// hydraraptor.blogspot.com
//
// This file is part of NopSCADlib.
//
// NopSCADlib is free software: you can redistribute it and/or modify it under the terms of the
// GNU General Public License as published by the Free Software Foundation, either version 3 of
// the License, or (at your option) any later version.
//
// NopSCADlib is distributed in the hope that it will be useful, but WITHOUT ANY WARRANTY;
// without even the implied warranty of MERCHANTABILITY or FITNESS FOR A PARTICULAR PURPOSE.
// See the GNU General Public License for more details.
//
// You should have received a copy of the GNU General Public License along with NopSCADlib.
// If not, see <https://www.gnu.org/licenses/>.
//

include <../global_defs.scad>
use <../utils/tube.scad>


module tubes() {
    linear_extrude(eps)
        ring(10, 8);

    translate([50, 10])
        tube(10, 8, 30);
}

tubes();
